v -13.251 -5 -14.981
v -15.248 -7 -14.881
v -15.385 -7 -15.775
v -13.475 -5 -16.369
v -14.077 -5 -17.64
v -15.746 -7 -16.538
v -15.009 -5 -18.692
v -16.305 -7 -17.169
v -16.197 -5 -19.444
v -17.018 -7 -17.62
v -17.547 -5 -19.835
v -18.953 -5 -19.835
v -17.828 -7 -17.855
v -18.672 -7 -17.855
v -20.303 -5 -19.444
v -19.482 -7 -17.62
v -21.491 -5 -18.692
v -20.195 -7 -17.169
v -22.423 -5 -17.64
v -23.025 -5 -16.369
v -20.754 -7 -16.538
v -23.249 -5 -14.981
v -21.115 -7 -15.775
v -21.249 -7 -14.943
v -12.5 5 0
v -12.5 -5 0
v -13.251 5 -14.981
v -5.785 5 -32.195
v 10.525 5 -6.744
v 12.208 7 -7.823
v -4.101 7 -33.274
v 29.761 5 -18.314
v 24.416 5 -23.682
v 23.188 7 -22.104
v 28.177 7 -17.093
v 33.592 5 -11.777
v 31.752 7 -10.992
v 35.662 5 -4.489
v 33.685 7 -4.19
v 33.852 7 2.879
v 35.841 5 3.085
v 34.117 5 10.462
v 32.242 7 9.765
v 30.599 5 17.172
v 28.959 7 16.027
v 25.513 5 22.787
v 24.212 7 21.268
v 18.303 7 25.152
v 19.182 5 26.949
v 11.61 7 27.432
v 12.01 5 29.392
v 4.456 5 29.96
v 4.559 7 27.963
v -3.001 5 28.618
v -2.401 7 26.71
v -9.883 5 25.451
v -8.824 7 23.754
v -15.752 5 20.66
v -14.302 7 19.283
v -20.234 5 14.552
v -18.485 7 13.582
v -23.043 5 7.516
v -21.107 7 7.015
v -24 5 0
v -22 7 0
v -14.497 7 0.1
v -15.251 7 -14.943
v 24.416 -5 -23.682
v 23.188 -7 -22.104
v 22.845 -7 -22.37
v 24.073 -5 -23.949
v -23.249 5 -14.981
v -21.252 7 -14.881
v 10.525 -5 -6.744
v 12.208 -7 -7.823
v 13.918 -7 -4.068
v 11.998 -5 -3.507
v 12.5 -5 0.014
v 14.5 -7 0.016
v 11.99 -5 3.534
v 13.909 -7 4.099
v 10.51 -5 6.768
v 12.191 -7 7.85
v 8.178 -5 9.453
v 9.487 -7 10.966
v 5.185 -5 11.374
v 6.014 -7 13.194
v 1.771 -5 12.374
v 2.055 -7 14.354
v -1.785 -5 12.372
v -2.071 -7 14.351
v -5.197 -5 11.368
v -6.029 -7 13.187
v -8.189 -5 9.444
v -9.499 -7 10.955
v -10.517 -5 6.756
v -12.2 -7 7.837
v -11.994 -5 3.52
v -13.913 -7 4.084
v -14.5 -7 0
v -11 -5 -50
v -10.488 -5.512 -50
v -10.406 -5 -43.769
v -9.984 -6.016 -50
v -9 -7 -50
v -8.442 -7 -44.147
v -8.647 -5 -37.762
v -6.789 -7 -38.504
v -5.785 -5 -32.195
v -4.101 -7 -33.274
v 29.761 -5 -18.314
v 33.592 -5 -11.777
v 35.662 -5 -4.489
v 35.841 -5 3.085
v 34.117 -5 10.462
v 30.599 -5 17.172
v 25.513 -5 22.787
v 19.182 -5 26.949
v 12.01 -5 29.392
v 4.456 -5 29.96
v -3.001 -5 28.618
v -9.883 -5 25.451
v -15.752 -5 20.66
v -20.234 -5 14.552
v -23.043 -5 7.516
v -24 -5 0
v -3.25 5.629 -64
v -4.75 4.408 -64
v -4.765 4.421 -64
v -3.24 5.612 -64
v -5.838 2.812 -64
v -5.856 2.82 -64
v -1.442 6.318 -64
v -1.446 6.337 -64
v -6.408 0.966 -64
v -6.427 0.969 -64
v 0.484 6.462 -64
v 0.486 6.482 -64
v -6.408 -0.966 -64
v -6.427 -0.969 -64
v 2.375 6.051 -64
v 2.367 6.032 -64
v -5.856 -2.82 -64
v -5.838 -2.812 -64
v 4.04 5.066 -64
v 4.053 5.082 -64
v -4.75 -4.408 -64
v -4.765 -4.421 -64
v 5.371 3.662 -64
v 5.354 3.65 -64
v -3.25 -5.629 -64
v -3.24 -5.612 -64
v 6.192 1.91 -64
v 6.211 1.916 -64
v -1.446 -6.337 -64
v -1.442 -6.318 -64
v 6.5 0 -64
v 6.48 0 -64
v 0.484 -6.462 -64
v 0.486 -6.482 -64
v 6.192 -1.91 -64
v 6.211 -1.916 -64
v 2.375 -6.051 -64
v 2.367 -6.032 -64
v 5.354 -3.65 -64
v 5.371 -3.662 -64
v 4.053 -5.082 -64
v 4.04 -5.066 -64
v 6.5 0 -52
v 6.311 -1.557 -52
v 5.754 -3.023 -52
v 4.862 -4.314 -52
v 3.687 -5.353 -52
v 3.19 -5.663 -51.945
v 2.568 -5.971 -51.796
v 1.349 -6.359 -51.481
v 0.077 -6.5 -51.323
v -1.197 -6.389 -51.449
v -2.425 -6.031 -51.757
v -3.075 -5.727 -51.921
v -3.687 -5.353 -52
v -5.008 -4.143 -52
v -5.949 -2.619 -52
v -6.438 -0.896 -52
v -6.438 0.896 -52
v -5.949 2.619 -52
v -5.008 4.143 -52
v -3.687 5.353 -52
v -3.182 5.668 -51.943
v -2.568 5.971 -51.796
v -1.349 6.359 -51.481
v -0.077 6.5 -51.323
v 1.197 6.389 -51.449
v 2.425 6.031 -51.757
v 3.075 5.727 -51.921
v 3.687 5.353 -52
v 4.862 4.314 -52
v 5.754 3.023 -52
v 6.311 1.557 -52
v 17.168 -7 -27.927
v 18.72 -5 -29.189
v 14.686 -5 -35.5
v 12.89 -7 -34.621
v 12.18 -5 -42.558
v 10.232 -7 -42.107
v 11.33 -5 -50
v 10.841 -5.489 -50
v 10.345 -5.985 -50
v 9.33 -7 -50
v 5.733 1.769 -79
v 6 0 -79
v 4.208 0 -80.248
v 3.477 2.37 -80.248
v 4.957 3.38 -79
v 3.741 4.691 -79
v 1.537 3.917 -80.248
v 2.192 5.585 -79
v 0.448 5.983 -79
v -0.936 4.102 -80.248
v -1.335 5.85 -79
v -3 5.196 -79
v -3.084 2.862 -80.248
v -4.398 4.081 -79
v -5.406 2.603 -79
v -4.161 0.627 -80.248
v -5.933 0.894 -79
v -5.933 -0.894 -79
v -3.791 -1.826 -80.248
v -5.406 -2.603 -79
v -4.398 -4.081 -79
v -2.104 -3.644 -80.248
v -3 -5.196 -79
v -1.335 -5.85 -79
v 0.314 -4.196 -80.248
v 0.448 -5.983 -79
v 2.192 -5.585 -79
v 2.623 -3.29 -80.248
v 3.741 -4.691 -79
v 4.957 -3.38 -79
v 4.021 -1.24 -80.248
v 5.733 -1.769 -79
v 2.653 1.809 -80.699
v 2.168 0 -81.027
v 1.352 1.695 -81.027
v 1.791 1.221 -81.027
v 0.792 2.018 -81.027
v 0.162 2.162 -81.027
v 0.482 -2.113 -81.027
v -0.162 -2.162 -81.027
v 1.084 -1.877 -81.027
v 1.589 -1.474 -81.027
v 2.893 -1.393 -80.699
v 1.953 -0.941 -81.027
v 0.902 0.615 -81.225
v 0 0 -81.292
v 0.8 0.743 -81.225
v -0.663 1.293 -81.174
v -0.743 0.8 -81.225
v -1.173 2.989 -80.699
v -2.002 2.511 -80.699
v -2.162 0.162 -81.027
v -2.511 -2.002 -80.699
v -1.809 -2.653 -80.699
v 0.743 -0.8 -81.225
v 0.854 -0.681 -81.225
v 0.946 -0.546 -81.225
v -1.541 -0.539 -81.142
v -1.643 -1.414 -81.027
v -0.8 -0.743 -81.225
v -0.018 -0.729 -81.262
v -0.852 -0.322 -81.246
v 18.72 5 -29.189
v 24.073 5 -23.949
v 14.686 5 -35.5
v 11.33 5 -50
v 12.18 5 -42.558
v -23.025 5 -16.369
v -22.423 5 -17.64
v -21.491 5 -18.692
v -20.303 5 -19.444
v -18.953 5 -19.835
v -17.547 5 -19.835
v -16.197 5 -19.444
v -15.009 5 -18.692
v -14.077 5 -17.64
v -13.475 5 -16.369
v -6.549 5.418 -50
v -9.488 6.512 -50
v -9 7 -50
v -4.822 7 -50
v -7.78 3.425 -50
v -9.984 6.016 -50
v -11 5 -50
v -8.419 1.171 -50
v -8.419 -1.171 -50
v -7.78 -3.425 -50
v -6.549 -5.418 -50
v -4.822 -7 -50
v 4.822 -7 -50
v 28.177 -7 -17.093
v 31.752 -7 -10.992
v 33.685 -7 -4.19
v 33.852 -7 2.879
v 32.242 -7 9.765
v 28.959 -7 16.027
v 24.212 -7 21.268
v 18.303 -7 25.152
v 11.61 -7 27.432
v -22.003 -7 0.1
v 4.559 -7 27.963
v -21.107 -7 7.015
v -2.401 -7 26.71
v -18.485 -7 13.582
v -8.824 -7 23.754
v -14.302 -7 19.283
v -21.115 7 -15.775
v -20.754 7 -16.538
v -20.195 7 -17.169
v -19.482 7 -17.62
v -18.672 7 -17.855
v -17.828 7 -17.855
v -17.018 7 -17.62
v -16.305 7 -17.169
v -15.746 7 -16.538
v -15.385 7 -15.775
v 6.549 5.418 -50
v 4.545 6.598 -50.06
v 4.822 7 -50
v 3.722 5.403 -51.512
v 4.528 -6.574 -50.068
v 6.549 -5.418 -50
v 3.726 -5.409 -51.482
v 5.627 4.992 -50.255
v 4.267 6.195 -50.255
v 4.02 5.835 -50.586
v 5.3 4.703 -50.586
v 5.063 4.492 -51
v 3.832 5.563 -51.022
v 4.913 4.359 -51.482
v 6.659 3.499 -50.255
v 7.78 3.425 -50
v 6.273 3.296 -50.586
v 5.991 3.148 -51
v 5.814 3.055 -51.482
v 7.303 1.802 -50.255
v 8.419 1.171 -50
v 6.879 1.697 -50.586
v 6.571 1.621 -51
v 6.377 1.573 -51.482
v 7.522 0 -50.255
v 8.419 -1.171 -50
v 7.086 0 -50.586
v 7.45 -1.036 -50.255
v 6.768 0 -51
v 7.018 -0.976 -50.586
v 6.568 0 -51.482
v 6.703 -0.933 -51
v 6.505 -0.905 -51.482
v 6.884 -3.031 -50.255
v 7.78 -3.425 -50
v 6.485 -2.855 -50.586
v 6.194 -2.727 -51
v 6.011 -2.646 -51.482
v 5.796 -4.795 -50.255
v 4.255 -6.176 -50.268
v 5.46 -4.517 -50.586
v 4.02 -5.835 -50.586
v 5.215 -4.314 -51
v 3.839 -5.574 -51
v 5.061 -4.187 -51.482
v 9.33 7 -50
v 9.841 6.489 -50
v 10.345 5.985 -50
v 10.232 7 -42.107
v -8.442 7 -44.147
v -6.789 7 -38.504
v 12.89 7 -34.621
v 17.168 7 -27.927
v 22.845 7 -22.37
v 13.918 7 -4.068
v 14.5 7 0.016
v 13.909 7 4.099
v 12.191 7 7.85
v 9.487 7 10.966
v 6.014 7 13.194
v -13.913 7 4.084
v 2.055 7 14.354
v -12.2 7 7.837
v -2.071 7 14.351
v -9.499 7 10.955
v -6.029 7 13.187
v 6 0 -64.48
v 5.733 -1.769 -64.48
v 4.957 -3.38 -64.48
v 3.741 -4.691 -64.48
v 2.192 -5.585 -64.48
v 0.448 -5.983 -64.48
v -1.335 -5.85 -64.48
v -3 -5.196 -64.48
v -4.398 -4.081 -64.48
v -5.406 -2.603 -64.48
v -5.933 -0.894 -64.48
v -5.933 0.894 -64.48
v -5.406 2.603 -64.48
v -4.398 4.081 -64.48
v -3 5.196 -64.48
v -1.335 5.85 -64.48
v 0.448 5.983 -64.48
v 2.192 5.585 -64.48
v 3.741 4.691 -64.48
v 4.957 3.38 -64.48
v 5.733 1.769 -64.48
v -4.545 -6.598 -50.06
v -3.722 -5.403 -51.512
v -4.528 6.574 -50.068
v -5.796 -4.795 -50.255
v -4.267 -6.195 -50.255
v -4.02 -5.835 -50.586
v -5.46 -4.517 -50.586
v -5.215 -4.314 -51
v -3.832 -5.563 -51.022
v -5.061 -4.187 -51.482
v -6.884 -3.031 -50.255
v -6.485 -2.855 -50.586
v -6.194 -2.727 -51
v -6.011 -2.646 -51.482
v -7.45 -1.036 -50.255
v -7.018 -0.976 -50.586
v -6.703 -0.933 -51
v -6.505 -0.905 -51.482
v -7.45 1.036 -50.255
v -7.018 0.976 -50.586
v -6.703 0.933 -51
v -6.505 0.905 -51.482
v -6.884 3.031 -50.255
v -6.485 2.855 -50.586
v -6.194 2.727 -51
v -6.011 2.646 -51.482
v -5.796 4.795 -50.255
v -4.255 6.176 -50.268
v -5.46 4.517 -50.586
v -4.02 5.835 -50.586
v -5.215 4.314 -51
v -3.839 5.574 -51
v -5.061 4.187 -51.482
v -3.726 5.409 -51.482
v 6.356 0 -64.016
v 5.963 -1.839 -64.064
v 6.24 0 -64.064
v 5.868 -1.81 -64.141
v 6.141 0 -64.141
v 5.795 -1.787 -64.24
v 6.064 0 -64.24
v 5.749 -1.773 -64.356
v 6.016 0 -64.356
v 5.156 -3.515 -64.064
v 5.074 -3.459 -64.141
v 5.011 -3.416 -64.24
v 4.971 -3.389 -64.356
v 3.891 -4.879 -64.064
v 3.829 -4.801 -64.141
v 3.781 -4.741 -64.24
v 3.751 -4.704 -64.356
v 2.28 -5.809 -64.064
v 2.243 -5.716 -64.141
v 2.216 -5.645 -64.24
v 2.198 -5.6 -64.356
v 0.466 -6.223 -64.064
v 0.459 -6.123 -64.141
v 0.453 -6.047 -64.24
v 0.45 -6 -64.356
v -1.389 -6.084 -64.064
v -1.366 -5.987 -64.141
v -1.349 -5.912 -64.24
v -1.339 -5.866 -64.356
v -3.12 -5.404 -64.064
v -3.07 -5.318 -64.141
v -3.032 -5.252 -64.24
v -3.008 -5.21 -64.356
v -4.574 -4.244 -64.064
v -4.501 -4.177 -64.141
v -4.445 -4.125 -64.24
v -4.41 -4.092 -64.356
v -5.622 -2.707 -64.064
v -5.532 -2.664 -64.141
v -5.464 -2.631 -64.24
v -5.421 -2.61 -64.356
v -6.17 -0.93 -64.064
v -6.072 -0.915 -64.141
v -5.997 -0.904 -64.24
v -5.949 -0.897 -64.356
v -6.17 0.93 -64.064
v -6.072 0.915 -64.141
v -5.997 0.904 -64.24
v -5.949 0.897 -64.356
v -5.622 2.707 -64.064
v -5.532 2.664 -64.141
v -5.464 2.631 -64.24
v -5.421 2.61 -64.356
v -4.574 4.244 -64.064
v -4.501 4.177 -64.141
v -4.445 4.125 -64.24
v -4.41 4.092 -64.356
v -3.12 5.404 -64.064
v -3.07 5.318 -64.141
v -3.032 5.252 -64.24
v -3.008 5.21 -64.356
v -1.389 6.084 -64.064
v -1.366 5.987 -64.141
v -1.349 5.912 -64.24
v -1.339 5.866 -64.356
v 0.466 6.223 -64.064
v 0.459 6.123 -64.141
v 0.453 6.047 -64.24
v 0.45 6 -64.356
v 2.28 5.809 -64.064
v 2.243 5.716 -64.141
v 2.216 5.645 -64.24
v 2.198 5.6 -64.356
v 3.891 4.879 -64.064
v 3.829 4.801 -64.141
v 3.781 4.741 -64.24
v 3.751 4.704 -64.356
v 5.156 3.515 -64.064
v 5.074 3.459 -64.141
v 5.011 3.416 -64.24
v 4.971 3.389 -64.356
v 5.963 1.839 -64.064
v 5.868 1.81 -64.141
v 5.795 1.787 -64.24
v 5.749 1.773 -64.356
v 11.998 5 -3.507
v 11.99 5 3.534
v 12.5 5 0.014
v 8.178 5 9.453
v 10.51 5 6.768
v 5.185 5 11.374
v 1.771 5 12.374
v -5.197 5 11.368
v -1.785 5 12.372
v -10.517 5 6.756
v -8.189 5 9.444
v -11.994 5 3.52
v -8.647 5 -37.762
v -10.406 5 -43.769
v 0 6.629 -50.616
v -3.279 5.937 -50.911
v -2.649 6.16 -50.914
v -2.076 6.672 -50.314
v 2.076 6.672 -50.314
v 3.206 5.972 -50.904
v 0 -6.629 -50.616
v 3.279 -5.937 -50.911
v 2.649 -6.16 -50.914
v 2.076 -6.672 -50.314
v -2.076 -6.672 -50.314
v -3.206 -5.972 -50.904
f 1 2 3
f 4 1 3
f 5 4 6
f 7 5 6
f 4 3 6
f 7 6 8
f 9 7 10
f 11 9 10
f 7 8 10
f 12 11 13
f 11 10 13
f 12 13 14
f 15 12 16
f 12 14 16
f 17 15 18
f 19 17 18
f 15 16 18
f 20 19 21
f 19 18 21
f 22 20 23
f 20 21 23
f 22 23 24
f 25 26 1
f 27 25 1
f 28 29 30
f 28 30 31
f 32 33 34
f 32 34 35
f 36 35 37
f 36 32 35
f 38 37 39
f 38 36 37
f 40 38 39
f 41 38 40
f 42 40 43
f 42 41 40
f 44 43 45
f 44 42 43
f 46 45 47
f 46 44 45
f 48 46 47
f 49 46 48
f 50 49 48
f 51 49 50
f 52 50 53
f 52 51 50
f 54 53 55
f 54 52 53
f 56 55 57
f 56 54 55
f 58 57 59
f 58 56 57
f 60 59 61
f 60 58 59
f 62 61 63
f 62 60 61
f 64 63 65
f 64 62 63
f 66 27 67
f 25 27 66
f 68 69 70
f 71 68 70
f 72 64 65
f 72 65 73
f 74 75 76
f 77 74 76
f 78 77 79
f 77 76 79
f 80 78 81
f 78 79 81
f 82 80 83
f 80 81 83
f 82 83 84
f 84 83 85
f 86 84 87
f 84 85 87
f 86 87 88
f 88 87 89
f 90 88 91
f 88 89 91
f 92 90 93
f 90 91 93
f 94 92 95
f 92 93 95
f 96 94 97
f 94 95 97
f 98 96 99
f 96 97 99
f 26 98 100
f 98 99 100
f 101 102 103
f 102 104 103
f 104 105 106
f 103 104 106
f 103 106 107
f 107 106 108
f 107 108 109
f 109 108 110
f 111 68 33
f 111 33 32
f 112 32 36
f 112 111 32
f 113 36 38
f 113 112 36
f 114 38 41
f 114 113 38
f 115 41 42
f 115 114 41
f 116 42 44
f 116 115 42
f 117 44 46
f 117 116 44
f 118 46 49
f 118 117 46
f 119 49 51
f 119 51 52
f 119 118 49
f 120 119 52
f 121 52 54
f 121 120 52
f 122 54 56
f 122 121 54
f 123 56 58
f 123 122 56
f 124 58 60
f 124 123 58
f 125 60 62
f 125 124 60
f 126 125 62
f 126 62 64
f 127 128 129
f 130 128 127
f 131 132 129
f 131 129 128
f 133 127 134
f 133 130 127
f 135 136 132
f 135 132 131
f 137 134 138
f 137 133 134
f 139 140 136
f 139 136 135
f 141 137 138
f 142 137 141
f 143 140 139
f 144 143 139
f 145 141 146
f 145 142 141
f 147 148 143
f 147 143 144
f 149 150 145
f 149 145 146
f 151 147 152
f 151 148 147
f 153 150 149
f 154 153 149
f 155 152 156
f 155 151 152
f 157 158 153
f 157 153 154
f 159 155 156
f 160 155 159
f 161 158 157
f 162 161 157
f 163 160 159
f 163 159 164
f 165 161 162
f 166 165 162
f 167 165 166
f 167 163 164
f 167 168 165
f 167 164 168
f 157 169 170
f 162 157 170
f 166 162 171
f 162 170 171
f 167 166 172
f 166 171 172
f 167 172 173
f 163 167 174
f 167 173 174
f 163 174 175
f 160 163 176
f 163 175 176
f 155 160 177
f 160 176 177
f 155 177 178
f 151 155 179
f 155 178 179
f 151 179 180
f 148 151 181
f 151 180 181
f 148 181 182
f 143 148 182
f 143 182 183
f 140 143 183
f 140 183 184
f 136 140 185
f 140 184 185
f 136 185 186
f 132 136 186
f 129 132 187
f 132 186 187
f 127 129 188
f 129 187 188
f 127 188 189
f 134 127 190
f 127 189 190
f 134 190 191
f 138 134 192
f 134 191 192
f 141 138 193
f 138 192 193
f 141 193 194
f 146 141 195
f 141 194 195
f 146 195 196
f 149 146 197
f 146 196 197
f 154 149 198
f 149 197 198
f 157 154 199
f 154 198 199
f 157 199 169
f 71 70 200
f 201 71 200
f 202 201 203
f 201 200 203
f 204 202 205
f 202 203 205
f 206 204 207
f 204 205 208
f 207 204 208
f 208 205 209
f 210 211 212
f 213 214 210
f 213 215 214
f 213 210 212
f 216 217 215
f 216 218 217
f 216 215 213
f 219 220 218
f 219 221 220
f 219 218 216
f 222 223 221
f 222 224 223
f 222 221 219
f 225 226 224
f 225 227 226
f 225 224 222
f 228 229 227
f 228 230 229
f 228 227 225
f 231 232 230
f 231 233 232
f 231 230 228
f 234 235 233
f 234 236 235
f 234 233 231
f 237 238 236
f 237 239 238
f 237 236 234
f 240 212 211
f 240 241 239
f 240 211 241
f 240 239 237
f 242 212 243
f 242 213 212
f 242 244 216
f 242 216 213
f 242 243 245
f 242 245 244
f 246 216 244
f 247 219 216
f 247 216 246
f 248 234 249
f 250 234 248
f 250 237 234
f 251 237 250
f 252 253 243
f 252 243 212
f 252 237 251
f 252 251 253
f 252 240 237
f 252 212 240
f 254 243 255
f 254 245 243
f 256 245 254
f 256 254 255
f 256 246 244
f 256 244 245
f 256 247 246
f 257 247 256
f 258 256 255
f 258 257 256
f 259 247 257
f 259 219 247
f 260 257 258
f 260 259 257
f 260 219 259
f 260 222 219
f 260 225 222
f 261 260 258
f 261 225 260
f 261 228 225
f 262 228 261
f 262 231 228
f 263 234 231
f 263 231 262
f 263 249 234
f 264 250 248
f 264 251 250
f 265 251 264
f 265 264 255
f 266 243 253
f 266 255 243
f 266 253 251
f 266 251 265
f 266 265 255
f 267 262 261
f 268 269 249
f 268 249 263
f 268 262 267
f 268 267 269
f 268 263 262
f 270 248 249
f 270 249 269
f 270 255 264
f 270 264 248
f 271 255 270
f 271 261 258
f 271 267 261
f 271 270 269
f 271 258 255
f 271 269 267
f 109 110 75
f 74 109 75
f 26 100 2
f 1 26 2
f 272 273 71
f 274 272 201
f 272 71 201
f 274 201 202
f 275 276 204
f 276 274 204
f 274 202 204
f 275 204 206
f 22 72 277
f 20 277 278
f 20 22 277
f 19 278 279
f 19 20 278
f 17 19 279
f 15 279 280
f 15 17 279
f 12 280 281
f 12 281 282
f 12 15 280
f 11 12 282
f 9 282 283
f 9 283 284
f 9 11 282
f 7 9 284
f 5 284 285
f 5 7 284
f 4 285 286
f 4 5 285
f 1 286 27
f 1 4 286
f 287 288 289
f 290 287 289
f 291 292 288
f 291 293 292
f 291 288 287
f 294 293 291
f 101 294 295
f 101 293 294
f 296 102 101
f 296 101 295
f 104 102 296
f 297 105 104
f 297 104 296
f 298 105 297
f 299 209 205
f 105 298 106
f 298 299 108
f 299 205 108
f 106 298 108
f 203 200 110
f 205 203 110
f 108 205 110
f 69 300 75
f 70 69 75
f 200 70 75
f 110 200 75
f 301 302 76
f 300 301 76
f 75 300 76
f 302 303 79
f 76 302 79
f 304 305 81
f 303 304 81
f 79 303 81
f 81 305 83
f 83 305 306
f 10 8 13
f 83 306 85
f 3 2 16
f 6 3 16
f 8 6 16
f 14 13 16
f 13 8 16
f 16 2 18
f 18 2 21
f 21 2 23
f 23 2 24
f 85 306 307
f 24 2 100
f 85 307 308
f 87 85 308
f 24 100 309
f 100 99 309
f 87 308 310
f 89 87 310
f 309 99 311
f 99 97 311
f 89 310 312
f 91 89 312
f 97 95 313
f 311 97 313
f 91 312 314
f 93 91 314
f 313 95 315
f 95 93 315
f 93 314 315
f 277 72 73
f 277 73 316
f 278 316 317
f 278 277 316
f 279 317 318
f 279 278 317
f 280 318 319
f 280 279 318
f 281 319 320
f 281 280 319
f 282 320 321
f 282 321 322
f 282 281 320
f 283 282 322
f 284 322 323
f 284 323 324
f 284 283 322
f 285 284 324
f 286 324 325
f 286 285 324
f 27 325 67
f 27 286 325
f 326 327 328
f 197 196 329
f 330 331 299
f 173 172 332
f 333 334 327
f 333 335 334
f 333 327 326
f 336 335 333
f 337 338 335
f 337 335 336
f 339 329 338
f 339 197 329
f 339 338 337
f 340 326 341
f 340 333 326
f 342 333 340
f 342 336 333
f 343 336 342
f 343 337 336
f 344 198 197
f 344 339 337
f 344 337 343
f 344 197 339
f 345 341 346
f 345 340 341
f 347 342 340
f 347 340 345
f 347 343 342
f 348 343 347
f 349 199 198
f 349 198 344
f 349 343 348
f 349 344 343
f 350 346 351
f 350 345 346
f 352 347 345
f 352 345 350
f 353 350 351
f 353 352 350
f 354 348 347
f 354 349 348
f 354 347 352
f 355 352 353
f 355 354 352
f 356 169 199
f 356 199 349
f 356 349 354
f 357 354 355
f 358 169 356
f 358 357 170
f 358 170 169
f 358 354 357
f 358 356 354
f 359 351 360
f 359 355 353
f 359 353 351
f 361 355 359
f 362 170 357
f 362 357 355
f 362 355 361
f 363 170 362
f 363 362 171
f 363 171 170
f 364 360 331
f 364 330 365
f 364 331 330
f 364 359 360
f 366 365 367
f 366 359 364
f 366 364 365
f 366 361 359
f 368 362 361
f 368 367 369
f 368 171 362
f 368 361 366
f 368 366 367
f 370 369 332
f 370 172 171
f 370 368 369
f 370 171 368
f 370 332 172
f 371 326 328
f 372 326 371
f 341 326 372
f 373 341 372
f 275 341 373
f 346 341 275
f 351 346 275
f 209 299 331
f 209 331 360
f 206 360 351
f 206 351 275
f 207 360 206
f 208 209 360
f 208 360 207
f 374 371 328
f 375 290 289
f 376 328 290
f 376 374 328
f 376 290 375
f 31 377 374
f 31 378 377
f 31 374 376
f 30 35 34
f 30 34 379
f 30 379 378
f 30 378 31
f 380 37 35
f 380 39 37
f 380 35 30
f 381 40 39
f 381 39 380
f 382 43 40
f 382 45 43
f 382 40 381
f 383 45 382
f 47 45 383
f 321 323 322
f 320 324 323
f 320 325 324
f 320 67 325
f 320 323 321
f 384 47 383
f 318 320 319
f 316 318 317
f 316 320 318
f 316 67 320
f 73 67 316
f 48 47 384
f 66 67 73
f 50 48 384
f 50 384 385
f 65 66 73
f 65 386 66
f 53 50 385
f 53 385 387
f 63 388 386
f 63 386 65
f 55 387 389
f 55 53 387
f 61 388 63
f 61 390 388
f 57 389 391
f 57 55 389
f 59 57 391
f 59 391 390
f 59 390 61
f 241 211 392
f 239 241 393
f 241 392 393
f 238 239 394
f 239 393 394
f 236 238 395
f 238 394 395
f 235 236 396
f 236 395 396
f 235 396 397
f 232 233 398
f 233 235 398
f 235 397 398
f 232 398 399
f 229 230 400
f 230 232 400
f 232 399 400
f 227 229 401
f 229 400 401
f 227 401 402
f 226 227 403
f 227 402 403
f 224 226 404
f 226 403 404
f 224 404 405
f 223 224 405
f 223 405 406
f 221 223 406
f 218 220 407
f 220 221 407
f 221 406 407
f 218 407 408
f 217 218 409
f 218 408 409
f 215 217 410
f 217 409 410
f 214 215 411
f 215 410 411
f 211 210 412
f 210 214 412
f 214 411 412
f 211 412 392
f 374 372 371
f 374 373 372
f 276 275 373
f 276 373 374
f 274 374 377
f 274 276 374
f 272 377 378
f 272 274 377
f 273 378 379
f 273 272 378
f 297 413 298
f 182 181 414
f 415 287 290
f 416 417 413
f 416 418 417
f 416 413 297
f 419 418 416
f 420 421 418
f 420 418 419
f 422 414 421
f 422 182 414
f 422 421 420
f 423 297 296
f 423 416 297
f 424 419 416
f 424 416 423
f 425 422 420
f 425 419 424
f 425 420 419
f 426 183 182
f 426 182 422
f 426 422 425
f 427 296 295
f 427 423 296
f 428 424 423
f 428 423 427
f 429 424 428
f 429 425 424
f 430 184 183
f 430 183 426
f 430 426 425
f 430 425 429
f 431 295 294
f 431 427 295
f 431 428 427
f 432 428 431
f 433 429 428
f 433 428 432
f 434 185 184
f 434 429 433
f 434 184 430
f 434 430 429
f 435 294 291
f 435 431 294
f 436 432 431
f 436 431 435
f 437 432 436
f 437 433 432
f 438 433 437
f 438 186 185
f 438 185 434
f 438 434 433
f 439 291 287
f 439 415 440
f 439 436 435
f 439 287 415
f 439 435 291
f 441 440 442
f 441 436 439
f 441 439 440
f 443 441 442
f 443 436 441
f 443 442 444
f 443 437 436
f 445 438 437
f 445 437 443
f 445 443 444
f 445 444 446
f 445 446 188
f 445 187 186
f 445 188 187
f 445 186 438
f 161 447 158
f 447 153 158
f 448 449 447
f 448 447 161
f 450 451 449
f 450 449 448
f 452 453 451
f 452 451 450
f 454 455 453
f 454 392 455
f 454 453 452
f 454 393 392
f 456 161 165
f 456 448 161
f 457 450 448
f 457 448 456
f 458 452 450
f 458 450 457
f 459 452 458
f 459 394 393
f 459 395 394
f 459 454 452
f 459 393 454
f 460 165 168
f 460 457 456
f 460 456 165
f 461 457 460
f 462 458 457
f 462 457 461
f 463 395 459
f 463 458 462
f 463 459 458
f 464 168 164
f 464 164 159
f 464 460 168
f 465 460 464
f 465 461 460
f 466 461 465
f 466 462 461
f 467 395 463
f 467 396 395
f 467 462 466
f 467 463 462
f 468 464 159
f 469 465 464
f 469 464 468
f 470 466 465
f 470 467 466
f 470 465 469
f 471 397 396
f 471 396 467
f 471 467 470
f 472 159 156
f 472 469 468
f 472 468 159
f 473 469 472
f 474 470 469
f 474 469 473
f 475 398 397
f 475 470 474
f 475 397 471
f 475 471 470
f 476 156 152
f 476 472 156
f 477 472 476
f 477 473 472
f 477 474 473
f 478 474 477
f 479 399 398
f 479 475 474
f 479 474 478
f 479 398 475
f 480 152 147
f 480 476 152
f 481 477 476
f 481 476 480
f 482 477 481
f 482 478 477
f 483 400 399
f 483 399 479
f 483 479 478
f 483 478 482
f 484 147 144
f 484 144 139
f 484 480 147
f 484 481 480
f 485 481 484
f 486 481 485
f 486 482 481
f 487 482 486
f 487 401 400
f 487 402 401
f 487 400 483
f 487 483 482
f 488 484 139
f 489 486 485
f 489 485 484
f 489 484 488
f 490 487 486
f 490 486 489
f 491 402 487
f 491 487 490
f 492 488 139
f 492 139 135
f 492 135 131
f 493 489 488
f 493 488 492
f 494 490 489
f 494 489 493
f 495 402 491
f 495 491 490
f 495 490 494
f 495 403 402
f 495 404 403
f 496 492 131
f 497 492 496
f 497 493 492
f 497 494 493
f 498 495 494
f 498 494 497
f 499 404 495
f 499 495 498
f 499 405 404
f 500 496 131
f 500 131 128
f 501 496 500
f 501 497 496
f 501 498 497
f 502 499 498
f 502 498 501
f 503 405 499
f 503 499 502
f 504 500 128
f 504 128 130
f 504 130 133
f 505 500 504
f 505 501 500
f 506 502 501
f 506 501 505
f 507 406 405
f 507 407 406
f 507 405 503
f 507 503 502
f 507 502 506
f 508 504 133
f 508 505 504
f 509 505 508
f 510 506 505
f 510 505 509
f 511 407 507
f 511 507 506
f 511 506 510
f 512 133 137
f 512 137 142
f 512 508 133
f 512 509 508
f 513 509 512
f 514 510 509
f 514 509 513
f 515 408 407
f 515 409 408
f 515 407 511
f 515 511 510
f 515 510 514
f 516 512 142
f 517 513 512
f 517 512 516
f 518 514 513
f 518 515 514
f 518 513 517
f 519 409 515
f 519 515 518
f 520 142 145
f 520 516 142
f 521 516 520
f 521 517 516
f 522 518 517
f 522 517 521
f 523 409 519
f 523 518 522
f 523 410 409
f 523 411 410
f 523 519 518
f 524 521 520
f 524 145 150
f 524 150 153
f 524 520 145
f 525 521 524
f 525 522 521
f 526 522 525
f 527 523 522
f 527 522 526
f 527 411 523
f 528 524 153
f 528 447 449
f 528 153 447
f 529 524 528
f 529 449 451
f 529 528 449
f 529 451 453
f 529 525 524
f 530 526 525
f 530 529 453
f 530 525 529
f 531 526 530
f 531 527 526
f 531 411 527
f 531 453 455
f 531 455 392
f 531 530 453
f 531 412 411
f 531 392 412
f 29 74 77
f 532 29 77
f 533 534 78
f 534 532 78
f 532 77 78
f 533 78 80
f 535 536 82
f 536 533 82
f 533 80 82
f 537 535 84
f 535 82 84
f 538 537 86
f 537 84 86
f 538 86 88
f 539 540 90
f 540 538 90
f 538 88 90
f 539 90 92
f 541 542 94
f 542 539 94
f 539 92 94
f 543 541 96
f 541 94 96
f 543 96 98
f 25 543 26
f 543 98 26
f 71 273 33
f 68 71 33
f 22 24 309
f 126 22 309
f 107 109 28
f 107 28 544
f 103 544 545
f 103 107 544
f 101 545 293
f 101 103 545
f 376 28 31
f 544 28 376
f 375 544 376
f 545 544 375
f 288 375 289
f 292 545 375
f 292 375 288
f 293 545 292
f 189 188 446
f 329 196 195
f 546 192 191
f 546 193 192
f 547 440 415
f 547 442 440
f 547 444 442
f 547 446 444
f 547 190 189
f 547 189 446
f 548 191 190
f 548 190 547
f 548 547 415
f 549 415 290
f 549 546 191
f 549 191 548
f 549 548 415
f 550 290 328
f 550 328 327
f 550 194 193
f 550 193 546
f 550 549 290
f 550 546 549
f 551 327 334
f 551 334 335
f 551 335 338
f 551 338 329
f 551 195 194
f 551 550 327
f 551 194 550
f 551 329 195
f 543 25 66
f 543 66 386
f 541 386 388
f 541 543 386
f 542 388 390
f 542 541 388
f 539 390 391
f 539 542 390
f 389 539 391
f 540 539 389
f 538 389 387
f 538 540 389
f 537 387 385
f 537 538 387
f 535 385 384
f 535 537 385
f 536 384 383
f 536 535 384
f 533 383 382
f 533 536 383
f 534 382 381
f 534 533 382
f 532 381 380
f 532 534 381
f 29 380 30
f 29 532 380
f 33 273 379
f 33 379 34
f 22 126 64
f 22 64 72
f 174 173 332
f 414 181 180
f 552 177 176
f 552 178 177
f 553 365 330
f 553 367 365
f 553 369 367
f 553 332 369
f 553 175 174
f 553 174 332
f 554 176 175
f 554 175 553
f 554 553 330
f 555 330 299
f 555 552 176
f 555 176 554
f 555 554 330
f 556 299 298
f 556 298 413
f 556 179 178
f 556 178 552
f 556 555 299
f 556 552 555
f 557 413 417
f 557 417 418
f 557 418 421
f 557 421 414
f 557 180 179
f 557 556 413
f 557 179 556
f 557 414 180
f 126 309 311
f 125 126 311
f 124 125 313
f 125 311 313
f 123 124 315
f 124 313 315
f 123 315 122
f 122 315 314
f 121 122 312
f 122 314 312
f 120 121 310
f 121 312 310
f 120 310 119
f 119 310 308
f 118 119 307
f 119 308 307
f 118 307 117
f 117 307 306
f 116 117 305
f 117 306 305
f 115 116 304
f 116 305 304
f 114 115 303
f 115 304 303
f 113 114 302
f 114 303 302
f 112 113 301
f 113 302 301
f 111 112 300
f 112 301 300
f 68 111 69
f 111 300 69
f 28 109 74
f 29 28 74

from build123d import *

# Parameters (mm, degrees)
PAD_DEPTH       = 7
CHAMFER_SIZE    = 2
CHAMFER001_SIZE = 2
SKETCH001_R     = 6.5
PAD001_DEPTH    = 14
FILLET_R        = 2
SKETCH002_R     = 6
PAD002_DEPTH    = 15
FILLET001_R     = 0.48


with BuildPart() as pad002:
    # Sketch → Pad (new body, symmetric)
    with BuildSketch(Plane.XZ):
        with BuildLine():
            ThreePointArc((10.524526, -6.744209), (3.513789, 11.99597), (-12.5, 0))
            Line((-12.5, 0), (-13.250923, -14.981192))
            ThreePointArc((-23.249077, -14.981192), (-18.25, -19.8851), (-13.250923, -14.981192))
            Line((-24, 0), (-23.249077, -14.981192))
            ThreePointArc((24.415762, -23.682477), (19.181941, 26.948774), (-24, 0))
            Line((24.072611, -23.949315), (24.415762, -23.682477))
            ThreePointArc((24.072611, -23.949315), (14.686334, -35.499894), (11.33, -50))
            Line((-11, -50), (11.33, -50))
            ThreePointArc((-5.784749, -32.195289), (-9.66936, -40.723598), (-11, -50))
            Line((-5.784749, -32.195289), (10.524526, -6.744209))
        make_face()
    extrude(amount=PAD_DEPTH, both=True)

    # Chamfer
    chamfer_edges = [pad002.edges().sort_by_distance(p)[0] for p in [
        (3.513789, -7, 11.99597),
    ]]
    chamfer(chamfer_edges, length=CHAMFER_SIZE)

    # Chamfer001
    chamfer001_edges = [pad002.edges().sort_by_distance(p)[0] for p in [
        (19.181941, 7, 26.948774),
    ]]
    chamfer(chamfer001_edges, length=CHAMFER001_SIZE)

    # Sketch001 → Pad001 (new body)
    with BuildSketch(Plane(origin=(0, 0, -50), x_dir=(1, 0, 0), z_dir=(0, 0, -1))):
        Circle(SKETCH001_R)
    extrude(amount=PAD001_DEPTH)

    # Fillet
    fillet_edges = [pad002.edges().sort_by_distance(p)[0] for p in [
        (-6.5, 0, -50),
    ]]
    fillet(fillet_edges, radius=FILLET_R)

    # Sketch002 → Pad002 (new body)
    with BuildSketch(Plane(origin=(0, 0, -64), x_dir=(1, 0, 0), z_dir=(0, 0, -1))):
        Circle(SKETCH002_R)
    extrude(amount=PAD002_DEPTH)


with BuildPart() as fillet001:
    # Sketch003 → Revolution (revolve)
    with BuildSketch(Plane.XZ):
        with BuildLine():
            Line((0, -63.291796), (0, -81.291796))
            ThreePointArc((0, -81.291796), (3.211399, -80.699347), (6, -79))
            Line((6, -65.583592), (6, -79))
            ThreePointArc((6, -65.583592), (3.211399, -63.884245), (0, -63.291796))
        make_face()
    revolve(axis=Axis((0, 0, 0), (0, 0, 1)))

    # Fusion: union Pad002
    add(pad002.part)

    # Fillet001
    fillet001_edges = [fillet001.edges().sort_by_distance(p)[0] for p in [
        (-6, 0, -64),
    ]]
    fillet(fillet001_edges, radius=FILLET001_R)


solid = fillet001.part
